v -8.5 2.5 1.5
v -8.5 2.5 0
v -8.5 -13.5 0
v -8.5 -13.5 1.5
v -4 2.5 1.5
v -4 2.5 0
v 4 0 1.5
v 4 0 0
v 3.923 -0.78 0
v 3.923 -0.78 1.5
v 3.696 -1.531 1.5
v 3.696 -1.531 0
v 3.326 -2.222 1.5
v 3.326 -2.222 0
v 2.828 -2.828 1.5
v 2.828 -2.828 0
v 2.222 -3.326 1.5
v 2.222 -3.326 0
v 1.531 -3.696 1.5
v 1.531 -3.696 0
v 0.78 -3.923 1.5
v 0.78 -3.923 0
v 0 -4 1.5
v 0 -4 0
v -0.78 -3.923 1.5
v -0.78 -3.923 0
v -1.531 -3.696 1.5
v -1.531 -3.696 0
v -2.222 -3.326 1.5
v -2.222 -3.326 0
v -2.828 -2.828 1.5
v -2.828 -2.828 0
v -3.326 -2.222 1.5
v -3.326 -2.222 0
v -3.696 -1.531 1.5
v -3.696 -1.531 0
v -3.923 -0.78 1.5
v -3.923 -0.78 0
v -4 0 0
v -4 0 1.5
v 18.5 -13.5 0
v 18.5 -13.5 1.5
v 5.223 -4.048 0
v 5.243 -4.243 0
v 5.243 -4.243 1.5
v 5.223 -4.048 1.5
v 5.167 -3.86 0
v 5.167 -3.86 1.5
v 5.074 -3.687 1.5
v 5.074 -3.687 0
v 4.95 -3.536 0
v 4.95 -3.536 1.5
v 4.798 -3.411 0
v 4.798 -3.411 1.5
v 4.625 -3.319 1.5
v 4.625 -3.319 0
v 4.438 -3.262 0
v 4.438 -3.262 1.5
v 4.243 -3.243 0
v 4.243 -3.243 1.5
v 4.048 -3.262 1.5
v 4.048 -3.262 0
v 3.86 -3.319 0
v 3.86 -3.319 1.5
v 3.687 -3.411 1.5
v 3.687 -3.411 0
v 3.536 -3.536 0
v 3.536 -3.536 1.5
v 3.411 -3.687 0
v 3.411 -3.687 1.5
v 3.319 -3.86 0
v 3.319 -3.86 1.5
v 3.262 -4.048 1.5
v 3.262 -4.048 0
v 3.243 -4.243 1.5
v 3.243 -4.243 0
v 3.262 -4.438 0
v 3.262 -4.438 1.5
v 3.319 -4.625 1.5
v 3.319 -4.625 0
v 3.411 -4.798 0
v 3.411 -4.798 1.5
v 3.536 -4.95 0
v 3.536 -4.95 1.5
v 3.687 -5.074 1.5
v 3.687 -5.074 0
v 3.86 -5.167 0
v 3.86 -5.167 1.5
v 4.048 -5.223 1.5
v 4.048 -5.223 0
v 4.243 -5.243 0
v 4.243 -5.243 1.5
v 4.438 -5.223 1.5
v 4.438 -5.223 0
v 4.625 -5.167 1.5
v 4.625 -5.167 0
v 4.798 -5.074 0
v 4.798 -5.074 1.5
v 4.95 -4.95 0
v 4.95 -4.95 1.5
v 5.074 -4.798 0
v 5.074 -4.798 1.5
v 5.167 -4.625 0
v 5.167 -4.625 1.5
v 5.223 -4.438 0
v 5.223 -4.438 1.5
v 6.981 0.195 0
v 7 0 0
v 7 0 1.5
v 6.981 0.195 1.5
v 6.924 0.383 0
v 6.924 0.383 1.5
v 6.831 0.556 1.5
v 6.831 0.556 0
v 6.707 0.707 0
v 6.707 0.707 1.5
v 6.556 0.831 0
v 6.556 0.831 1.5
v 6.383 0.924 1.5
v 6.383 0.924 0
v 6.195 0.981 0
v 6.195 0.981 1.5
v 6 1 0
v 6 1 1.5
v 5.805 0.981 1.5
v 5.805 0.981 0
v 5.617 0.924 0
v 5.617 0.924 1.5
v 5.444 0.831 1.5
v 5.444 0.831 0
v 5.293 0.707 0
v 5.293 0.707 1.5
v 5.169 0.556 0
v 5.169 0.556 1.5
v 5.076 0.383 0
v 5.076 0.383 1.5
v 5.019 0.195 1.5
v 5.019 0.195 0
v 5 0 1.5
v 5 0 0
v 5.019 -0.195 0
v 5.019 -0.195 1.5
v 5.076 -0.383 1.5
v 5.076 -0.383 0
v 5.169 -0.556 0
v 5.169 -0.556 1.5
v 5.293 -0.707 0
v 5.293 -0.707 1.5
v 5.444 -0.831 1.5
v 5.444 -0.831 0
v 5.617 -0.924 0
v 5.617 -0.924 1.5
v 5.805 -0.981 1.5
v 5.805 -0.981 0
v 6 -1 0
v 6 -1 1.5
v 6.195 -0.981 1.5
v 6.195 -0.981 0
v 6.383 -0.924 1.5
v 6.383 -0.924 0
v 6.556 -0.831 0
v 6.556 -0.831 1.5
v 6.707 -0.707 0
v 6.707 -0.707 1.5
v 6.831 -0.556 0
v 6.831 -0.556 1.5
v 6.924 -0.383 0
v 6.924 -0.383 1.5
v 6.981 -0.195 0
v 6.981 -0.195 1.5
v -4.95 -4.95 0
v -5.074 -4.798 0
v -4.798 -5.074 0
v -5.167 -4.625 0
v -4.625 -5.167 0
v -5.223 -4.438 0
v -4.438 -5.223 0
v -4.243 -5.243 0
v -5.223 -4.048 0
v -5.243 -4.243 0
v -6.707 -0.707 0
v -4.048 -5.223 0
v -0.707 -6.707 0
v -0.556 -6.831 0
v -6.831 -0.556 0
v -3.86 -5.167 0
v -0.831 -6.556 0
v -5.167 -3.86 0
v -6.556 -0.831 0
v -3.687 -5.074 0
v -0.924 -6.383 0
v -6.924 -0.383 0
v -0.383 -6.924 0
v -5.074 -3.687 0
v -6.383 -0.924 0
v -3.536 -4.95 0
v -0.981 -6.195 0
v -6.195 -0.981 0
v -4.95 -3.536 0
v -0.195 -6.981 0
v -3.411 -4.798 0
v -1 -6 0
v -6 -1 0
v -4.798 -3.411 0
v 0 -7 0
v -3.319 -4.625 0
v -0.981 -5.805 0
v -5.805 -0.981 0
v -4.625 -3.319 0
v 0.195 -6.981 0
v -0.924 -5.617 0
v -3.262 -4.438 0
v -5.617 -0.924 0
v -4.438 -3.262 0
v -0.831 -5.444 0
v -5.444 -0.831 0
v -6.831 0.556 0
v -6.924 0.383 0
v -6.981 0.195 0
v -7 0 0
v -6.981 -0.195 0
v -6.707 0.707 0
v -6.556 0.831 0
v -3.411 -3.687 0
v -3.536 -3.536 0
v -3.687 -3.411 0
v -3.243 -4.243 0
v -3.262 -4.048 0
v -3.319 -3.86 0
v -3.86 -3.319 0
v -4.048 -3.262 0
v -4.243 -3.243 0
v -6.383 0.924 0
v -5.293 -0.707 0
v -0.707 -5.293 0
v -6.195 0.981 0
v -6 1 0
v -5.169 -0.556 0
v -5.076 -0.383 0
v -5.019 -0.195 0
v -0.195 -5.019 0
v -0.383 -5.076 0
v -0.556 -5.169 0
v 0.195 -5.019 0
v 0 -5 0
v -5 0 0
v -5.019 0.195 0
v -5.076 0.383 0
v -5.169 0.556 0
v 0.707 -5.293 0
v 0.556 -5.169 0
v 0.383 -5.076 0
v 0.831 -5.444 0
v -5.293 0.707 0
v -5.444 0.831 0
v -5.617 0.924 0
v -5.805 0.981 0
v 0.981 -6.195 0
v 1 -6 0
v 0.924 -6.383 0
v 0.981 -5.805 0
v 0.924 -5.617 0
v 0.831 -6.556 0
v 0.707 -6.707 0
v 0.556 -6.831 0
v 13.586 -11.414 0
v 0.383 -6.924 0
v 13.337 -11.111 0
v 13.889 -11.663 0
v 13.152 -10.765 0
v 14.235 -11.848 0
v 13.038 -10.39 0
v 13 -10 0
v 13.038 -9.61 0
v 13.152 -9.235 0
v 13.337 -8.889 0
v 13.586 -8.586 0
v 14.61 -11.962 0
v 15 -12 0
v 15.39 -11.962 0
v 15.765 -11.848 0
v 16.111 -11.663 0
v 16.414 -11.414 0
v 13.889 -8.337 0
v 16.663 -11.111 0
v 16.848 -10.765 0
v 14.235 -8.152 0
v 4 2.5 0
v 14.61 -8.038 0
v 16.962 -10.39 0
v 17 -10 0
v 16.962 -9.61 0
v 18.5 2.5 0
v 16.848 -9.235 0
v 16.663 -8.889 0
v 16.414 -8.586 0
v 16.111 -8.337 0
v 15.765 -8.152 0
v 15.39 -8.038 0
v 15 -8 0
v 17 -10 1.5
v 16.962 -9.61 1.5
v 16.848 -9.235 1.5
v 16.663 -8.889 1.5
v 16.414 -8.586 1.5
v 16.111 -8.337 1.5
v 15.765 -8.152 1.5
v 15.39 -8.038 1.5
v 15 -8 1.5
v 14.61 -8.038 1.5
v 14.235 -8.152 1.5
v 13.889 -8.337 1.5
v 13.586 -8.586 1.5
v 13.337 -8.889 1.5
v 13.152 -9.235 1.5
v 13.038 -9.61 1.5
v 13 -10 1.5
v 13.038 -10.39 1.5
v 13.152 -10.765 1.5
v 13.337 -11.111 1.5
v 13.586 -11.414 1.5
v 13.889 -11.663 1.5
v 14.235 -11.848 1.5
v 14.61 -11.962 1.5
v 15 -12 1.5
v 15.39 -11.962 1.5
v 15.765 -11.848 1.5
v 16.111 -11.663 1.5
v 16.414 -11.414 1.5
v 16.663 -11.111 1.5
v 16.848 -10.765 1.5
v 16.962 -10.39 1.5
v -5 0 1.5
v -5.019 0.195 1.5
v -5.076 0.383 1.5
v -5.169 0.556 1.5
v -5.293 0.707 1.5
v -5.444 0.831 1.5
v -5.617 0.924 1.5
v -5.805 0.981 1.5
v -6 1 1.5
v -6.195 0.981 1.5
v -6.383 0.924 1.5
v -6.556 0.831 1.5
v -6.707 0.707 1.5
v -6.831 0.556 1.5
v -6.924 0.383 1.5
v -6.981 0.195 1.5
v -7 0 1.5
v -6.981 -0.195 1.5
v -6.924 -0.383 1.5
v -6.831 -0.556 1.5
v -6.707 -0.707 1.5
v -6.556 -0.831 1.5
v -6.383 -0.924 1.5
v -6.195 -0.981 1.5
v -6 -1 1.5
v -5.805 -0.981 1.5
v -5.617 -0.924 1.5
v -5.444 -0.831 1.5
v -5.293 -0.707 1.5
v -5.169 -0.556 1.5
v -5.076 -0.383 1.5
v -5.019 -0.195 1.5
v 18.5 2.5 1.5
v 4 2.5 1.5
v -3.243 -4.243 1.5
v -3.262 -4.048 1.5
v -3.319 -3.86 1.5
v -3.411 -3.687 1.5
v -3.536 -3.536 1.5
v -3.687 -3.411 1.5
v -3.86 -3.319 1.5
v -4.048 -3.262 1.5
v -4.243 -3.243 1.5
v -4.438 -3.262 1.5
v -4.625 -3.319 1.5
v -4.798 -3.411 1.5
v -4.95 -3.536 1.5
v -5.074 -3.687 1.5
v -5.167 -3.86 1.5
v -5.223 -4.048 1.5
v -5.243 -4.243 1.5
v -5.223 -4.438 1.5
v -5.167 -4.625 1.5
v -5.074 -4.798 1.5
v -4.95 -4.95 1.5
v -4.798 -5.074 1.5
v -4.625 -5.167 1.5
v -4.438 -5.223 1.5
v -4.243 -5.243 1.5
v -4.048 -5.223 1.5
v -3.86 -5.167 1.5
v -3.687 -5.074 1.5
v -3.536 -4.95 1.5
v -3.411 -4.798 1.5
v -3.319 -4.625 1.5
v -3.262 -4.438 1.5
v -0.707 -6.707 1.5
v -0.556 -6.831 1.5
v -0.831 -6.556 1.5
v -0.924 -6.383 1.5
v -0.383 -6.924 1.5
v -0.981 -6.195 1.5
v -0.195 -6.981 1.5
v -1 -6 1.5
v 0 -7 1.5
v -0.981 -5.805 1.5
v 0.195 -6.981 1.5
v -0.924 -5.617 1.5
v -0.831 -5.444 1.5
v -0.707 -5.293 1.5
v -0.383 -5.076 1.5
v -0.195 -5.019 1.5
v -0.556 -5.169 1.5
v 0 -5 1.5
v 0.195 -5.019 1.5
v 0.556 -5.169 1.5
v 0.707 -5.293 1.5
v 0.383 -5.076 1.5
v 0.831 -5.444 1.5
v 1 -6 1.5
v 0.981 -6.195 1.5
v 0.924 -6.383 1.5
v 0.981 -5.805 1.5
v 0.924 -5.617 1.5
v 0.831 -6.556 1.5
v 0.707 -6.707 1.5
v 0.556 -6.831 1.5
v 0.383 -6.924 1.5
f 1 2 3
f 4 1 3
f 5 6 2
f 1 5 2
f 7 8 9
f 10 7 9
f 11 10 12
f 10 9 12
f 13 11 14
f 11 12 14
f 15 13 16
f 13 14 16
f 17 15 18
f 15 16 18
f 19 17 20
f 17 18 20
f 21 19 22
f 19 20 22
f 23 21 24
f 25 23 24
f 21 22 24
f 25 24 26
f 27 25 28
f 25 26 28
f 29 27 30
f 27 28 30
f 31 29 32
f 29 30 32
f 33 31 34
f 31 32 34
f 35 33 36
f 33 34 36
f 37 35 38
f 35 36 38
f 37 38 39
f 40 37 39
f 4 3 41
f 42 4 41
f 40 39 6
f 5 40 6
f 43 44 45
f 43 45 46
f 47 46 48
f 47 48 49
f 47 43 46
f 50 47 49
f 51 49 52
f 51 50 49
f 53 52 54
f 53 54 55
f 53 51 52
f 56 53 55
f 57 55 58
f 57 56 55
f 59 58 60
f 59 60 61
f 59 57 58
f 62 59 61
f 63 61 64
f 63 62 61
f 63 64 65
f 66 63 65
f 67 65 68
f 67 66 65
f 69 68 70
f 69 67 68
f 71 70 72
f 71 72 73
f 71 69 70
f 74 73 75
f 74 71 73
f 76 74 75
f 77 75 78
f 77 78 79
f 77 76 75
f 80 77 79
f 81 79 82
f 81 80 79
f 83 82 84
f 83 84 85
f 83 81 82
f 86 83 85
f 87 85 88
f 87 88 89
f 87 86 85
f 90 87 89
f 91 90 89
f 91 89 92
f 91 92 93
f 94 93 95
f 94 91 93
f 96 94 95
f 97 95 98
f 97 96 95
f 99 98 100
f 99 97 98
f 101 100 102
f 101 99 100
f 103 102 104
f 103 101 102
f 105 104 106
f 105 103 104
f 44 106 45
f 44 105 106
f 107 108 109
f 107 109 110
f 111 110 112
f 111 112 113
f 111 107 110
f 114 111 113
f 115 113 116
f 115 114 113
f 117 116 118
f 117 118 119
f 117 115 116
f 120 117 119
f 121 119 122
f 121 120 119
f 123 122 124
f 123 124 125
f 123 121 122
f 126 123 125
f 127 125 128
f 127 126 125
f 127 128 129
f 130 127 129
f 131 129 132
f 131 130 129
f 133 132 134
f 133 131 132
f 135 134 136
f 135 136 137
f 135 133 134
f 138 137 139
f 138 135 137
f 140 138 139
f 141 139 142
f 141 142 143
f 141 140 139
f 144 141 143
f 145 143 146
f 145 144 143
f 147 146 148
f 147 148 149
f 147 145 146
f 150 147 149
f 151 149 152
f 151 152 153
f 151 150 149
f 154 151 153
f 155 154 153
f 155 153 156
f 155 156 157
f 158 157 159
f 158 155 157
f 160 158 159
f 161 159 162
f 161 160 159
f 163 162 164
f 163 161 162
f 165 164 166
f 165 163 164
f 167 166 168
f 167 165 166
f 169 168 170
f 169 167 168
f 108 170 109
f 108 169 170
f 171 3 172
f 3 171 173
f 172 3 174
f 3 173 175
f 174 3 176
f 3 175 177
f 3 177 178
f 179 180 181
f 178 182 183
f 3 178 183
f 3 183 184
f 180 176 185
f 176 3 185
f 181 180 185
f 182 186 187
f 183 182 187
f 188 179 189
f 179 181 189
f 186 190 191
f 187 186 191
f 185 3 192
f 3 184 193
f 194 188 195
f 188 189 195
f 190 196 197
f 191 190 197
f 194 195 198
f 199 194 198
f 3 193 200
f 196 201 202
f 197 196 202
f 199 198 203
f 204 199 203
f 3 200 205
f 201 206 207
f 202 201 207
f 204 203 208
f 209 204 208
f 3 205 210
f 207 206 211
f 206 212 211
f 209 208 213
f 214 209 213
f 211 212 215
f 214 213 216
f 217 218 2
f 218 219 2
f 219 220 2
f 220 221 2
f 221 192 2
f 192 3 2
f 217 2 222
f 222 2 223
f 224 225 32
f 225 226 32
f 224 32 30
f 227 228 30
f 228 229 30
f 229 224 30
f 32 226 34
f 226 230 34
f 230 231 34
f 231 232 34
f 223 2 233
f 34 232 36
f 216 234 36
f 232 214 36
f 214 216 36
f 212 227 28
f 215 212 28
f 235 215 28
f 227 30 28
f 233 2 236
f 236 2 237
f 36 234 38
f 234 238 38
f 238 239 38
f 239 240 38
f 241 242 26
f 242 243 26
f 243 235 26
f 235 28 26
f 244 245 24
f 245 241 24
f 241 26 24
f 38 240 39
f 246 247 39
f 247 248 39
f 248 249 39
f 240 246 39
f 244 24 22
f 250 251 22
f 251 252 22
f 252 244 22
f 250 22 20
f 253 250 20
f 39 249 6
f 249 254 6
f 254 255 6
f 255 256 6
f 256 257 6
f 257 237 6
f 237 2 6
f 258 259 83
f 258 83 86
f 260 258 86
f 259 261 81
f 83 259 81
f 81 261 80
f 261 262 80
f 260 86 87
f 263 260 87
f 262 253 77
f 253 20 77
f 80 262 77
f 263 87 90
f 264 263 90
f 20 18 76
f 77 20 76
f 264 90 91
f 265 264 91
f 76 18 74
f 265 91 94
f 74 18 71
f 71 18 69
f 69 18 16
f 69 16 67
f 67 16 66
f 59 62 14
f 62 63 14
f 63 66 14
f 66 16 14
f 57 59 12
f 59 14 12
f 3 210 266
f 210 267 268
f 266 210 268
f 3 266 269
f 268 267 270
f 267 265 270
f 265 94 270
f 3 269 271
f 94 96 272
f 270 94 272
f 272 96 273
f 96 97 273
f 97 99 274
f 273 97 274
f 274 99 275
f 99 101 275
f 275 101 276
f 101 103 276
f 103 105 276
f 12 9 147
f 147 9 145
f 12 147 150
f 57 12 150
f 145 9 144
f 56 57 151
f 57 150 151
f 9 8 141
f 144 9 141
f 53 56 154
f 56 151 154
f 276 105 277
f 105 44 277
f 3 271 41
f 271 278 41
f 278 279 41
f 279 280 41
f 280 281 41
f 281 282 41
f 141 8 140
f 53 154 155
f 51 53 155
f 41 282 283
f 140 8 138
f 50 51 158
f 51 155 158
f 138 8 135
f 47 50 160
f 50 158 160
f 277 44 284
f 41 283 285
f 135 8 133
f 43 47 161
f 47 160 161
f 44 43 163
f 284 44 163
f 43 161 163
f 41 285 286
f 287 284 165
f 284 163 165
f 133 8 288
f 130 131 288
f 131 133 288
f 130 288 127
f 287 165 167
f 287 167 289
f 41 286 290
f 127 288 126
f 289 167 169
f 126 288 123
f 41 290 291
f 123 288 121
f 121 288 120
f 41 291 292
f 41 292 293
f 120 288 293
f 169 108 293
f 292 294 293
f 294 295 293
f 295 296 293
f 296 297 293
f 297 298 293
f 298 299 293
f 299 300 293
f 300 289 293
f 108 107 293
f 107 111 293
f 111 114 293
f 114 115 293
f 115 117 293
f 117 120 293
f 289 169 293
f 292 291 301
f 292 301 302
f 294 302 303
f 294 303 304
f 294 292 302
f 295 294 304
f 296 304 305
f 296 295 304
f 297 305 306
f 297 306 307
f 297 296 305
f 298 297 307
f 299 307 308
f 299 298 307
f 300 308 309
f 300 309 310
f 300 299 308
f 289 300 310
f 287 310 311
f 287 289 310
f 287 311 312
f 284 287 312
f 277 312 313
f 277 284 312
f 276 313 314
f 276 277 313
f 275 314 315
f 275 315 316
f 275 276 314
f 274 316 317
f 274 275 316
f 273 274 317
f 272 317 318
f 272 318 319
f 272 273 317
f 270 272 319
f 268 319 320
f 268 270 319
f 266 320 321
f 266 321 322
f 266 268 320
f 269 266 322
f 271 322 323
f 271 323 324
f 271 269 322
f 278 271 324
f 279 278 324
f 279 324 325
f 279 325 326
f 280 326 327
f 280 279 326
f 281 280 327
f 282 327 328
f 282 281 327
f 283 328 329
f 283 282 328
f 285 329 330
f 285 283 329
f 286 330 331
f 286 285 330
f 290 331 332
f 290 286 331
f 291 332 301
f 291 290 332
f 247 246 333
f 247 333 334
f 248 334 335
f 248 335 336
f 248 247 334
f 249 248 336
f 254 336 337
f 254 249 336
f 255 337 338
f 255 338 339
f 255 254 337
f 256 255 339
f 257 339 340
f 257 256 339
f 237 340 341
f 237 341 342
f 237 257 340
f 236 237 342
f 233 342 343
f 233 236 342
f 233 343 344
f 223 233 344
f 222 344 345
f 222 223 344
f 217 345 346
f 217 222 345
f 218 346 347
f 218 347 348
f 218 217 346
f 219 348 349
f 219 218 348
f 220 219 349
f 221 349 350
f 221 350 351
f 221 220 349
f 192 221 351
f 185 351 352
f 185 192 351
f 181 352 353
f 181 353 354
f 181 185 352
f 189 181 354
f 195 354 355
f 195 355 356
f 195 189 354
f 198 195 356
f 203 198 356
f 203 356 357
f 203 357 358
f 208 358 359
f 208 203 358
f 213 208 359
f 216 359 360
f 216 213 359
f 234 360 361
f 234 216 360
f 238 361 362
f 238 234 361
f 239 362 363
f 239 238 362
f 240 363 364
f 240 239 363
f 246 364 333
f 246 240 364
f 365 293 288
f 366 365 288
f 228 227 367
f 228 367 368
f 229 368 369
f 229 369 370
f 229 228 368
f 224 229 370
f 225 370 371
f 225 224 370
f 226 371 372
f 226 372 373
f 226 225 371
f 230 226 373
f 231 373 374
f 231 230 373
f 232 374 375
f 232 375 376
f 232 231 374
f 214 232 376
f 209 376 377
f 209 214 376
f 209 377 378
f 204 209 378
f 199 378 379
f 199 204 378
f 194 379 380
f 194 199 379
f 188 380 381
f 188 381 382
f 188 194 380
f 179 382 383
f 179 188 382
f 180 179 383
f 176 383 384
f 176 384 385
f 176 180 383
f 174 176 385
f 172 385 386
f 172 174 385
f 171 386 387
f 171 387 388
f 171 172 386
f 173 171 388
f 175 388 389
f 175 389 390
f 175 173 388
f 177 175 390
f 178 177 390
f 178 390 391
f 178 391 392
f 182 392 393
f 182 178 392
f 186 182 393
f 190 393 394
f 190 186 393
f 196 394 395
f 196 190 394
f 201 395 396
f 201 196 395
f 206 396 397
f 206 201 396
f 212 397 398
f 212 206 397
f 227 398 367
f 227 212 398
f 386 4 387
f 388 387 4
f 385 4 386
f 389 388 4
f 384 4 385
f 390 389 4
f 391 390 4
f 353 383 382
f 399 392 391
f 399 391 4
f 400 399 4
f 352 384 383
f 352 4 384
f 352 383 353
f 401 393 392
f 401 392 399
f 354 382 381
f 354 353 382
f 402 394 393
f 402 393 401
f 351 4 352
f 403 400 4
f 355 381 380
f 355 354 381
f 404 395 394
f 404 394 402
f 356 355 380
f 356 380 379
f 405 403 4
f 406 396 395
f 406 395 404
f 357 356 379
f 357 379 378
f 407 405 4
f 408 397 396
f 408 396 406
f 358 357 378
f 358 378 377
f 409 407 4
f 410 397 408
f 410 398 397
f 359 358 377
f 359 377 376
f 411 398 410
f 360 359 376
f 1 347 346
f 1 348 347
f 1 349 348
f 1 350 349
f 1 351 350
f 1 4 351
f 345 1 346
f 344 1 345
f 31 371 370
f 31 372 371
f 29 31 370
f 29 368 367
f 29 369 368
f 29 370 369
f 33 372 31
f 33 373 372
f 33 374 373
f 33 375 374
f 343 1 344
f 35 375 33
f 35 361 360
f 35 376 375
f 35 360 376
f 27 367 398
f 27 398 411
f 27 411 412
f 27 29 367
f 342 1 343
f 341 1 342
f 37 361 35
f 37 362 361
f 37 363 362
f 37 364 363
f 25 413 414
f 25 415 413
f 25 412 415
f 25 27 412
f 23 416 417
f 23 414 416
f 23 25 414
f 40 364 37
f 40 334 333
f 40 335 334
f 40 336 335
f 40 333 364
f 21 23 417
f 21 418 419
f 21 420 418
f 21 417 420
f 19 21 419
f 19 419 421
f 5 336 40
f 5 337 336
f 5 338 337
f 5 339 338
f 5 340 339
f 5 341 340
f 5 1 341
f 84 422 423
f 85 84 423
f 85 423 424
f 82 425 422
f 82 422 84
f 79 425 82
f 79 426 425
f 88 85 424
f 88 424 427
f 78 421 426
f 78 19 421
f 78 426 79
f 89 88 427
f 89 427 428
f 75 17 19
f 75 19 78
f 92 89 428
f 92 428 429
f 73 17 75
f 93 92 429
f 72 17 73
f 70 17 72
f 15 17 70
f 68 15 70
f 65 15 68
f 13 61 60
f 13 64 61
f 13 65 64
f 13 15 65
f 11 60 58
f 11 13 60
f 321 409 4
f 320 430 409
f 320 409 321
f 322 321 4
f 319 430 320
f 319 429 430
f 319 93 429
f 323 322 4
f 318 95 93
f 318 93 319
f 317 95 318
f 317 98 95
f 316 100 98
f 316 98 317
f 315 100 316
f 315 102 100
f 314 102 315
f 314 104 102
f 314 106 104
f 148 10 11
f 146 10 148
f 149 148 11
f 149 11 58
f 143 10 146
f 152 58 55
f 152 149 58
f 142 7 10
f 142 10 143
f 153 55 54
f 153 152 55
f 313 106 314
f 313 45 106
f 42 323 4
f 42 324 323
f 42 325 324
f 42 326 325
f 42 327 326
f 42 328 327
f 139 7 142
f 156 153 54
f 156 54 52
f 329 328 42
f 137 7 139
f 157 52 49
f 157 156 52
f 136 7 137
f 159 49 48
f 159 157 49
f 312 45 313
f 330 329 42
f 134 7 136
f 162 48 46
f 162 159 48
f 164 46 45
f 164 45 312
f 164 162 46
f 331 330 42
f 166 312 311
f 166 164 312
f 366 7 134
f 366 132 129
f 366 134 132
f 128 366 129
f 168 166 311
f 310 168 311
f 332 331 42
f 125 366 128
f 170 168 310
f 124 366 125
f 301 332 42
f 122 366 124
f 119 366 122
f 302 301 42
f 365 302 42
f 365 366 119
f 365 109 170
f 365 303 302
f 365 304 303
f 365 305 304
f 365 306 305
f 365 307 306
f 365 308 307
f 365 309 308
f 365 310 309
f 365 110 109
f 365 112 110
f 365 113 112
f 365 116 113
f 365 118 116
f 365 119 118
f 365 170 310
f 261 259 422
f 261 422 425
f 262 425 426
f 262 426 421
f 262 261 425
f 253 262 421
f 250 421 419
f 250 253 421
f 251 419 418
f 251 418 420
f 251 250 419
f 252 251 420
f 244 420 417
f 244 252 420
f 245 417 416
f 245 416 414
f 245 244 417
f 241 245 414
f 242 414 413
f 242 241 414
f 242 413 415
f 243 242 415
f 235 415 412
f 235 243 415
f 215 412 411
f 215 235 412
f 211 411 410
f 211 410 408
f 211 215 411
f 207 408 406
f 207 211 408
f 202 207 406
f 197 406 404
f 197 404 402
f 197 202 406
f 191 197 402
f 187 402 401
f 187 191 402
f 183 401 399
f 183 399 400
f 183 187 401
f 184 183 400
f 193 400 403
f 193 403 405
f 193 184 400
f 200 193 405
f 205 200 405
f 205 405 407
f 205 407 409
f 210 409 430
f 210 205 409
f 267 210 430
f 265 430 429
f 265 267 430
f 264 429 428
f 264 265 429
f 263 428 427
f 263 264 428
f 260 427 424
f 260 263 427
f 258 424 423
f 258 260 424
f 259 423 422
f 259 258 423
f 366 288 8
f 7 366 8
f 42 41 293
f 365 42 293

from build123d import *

# Parameters (mm, degrees)
F0_R     = 1
F0_R_2   = 2
F1_DEPTH = 1.5


with BuildPart() as f1:
    # F0 (on Top) → F1 (new body)
    with BuildSketch(Plane.XY):
        with BuildLine():
            ThreePointArc((4, 0), (0, -4), (-4, 0))
            Line((-4, 0), (-4, 2.5))
            Line((-4, 2.5), (-8.5, 2.5))
            Line((-8.5, 2.5), (-8.5, -13.5))
            Line((-8.5, -13.5), (18.5, -13.5))
            Line((18.5, -13.5), (18.5, 2.5))
            Line((18.5, 2.5), (4, 2.5))
            Line((4, 2.5), (4, 0))
        make_face()
        with Locations((0, -6)):
            Circle(F0_R, mode=Mode.SUBTRACT)
        with Locations((15, -10)):
            Circle(F0_R_2, mode=Mode.SUBTRACT)
        with Locations((-4.242641, -4.242641)):
            Circle(F0_R, mode=Mode.SUBTRACT)
        with Locations((4.242641, -4.242641)):
            Circle(F0_R, mode=Mode.SUBTRACT)
        with Locations((-6, 0)):
            Circle(F0_R, mode=Mode.SUBTRACT)
        with Locations((6, 0)):
            Circle(F0_R, mode=Mode.SUBTRACT)
    extrude(amount=F1_DEPTH)


solid = f1.part
